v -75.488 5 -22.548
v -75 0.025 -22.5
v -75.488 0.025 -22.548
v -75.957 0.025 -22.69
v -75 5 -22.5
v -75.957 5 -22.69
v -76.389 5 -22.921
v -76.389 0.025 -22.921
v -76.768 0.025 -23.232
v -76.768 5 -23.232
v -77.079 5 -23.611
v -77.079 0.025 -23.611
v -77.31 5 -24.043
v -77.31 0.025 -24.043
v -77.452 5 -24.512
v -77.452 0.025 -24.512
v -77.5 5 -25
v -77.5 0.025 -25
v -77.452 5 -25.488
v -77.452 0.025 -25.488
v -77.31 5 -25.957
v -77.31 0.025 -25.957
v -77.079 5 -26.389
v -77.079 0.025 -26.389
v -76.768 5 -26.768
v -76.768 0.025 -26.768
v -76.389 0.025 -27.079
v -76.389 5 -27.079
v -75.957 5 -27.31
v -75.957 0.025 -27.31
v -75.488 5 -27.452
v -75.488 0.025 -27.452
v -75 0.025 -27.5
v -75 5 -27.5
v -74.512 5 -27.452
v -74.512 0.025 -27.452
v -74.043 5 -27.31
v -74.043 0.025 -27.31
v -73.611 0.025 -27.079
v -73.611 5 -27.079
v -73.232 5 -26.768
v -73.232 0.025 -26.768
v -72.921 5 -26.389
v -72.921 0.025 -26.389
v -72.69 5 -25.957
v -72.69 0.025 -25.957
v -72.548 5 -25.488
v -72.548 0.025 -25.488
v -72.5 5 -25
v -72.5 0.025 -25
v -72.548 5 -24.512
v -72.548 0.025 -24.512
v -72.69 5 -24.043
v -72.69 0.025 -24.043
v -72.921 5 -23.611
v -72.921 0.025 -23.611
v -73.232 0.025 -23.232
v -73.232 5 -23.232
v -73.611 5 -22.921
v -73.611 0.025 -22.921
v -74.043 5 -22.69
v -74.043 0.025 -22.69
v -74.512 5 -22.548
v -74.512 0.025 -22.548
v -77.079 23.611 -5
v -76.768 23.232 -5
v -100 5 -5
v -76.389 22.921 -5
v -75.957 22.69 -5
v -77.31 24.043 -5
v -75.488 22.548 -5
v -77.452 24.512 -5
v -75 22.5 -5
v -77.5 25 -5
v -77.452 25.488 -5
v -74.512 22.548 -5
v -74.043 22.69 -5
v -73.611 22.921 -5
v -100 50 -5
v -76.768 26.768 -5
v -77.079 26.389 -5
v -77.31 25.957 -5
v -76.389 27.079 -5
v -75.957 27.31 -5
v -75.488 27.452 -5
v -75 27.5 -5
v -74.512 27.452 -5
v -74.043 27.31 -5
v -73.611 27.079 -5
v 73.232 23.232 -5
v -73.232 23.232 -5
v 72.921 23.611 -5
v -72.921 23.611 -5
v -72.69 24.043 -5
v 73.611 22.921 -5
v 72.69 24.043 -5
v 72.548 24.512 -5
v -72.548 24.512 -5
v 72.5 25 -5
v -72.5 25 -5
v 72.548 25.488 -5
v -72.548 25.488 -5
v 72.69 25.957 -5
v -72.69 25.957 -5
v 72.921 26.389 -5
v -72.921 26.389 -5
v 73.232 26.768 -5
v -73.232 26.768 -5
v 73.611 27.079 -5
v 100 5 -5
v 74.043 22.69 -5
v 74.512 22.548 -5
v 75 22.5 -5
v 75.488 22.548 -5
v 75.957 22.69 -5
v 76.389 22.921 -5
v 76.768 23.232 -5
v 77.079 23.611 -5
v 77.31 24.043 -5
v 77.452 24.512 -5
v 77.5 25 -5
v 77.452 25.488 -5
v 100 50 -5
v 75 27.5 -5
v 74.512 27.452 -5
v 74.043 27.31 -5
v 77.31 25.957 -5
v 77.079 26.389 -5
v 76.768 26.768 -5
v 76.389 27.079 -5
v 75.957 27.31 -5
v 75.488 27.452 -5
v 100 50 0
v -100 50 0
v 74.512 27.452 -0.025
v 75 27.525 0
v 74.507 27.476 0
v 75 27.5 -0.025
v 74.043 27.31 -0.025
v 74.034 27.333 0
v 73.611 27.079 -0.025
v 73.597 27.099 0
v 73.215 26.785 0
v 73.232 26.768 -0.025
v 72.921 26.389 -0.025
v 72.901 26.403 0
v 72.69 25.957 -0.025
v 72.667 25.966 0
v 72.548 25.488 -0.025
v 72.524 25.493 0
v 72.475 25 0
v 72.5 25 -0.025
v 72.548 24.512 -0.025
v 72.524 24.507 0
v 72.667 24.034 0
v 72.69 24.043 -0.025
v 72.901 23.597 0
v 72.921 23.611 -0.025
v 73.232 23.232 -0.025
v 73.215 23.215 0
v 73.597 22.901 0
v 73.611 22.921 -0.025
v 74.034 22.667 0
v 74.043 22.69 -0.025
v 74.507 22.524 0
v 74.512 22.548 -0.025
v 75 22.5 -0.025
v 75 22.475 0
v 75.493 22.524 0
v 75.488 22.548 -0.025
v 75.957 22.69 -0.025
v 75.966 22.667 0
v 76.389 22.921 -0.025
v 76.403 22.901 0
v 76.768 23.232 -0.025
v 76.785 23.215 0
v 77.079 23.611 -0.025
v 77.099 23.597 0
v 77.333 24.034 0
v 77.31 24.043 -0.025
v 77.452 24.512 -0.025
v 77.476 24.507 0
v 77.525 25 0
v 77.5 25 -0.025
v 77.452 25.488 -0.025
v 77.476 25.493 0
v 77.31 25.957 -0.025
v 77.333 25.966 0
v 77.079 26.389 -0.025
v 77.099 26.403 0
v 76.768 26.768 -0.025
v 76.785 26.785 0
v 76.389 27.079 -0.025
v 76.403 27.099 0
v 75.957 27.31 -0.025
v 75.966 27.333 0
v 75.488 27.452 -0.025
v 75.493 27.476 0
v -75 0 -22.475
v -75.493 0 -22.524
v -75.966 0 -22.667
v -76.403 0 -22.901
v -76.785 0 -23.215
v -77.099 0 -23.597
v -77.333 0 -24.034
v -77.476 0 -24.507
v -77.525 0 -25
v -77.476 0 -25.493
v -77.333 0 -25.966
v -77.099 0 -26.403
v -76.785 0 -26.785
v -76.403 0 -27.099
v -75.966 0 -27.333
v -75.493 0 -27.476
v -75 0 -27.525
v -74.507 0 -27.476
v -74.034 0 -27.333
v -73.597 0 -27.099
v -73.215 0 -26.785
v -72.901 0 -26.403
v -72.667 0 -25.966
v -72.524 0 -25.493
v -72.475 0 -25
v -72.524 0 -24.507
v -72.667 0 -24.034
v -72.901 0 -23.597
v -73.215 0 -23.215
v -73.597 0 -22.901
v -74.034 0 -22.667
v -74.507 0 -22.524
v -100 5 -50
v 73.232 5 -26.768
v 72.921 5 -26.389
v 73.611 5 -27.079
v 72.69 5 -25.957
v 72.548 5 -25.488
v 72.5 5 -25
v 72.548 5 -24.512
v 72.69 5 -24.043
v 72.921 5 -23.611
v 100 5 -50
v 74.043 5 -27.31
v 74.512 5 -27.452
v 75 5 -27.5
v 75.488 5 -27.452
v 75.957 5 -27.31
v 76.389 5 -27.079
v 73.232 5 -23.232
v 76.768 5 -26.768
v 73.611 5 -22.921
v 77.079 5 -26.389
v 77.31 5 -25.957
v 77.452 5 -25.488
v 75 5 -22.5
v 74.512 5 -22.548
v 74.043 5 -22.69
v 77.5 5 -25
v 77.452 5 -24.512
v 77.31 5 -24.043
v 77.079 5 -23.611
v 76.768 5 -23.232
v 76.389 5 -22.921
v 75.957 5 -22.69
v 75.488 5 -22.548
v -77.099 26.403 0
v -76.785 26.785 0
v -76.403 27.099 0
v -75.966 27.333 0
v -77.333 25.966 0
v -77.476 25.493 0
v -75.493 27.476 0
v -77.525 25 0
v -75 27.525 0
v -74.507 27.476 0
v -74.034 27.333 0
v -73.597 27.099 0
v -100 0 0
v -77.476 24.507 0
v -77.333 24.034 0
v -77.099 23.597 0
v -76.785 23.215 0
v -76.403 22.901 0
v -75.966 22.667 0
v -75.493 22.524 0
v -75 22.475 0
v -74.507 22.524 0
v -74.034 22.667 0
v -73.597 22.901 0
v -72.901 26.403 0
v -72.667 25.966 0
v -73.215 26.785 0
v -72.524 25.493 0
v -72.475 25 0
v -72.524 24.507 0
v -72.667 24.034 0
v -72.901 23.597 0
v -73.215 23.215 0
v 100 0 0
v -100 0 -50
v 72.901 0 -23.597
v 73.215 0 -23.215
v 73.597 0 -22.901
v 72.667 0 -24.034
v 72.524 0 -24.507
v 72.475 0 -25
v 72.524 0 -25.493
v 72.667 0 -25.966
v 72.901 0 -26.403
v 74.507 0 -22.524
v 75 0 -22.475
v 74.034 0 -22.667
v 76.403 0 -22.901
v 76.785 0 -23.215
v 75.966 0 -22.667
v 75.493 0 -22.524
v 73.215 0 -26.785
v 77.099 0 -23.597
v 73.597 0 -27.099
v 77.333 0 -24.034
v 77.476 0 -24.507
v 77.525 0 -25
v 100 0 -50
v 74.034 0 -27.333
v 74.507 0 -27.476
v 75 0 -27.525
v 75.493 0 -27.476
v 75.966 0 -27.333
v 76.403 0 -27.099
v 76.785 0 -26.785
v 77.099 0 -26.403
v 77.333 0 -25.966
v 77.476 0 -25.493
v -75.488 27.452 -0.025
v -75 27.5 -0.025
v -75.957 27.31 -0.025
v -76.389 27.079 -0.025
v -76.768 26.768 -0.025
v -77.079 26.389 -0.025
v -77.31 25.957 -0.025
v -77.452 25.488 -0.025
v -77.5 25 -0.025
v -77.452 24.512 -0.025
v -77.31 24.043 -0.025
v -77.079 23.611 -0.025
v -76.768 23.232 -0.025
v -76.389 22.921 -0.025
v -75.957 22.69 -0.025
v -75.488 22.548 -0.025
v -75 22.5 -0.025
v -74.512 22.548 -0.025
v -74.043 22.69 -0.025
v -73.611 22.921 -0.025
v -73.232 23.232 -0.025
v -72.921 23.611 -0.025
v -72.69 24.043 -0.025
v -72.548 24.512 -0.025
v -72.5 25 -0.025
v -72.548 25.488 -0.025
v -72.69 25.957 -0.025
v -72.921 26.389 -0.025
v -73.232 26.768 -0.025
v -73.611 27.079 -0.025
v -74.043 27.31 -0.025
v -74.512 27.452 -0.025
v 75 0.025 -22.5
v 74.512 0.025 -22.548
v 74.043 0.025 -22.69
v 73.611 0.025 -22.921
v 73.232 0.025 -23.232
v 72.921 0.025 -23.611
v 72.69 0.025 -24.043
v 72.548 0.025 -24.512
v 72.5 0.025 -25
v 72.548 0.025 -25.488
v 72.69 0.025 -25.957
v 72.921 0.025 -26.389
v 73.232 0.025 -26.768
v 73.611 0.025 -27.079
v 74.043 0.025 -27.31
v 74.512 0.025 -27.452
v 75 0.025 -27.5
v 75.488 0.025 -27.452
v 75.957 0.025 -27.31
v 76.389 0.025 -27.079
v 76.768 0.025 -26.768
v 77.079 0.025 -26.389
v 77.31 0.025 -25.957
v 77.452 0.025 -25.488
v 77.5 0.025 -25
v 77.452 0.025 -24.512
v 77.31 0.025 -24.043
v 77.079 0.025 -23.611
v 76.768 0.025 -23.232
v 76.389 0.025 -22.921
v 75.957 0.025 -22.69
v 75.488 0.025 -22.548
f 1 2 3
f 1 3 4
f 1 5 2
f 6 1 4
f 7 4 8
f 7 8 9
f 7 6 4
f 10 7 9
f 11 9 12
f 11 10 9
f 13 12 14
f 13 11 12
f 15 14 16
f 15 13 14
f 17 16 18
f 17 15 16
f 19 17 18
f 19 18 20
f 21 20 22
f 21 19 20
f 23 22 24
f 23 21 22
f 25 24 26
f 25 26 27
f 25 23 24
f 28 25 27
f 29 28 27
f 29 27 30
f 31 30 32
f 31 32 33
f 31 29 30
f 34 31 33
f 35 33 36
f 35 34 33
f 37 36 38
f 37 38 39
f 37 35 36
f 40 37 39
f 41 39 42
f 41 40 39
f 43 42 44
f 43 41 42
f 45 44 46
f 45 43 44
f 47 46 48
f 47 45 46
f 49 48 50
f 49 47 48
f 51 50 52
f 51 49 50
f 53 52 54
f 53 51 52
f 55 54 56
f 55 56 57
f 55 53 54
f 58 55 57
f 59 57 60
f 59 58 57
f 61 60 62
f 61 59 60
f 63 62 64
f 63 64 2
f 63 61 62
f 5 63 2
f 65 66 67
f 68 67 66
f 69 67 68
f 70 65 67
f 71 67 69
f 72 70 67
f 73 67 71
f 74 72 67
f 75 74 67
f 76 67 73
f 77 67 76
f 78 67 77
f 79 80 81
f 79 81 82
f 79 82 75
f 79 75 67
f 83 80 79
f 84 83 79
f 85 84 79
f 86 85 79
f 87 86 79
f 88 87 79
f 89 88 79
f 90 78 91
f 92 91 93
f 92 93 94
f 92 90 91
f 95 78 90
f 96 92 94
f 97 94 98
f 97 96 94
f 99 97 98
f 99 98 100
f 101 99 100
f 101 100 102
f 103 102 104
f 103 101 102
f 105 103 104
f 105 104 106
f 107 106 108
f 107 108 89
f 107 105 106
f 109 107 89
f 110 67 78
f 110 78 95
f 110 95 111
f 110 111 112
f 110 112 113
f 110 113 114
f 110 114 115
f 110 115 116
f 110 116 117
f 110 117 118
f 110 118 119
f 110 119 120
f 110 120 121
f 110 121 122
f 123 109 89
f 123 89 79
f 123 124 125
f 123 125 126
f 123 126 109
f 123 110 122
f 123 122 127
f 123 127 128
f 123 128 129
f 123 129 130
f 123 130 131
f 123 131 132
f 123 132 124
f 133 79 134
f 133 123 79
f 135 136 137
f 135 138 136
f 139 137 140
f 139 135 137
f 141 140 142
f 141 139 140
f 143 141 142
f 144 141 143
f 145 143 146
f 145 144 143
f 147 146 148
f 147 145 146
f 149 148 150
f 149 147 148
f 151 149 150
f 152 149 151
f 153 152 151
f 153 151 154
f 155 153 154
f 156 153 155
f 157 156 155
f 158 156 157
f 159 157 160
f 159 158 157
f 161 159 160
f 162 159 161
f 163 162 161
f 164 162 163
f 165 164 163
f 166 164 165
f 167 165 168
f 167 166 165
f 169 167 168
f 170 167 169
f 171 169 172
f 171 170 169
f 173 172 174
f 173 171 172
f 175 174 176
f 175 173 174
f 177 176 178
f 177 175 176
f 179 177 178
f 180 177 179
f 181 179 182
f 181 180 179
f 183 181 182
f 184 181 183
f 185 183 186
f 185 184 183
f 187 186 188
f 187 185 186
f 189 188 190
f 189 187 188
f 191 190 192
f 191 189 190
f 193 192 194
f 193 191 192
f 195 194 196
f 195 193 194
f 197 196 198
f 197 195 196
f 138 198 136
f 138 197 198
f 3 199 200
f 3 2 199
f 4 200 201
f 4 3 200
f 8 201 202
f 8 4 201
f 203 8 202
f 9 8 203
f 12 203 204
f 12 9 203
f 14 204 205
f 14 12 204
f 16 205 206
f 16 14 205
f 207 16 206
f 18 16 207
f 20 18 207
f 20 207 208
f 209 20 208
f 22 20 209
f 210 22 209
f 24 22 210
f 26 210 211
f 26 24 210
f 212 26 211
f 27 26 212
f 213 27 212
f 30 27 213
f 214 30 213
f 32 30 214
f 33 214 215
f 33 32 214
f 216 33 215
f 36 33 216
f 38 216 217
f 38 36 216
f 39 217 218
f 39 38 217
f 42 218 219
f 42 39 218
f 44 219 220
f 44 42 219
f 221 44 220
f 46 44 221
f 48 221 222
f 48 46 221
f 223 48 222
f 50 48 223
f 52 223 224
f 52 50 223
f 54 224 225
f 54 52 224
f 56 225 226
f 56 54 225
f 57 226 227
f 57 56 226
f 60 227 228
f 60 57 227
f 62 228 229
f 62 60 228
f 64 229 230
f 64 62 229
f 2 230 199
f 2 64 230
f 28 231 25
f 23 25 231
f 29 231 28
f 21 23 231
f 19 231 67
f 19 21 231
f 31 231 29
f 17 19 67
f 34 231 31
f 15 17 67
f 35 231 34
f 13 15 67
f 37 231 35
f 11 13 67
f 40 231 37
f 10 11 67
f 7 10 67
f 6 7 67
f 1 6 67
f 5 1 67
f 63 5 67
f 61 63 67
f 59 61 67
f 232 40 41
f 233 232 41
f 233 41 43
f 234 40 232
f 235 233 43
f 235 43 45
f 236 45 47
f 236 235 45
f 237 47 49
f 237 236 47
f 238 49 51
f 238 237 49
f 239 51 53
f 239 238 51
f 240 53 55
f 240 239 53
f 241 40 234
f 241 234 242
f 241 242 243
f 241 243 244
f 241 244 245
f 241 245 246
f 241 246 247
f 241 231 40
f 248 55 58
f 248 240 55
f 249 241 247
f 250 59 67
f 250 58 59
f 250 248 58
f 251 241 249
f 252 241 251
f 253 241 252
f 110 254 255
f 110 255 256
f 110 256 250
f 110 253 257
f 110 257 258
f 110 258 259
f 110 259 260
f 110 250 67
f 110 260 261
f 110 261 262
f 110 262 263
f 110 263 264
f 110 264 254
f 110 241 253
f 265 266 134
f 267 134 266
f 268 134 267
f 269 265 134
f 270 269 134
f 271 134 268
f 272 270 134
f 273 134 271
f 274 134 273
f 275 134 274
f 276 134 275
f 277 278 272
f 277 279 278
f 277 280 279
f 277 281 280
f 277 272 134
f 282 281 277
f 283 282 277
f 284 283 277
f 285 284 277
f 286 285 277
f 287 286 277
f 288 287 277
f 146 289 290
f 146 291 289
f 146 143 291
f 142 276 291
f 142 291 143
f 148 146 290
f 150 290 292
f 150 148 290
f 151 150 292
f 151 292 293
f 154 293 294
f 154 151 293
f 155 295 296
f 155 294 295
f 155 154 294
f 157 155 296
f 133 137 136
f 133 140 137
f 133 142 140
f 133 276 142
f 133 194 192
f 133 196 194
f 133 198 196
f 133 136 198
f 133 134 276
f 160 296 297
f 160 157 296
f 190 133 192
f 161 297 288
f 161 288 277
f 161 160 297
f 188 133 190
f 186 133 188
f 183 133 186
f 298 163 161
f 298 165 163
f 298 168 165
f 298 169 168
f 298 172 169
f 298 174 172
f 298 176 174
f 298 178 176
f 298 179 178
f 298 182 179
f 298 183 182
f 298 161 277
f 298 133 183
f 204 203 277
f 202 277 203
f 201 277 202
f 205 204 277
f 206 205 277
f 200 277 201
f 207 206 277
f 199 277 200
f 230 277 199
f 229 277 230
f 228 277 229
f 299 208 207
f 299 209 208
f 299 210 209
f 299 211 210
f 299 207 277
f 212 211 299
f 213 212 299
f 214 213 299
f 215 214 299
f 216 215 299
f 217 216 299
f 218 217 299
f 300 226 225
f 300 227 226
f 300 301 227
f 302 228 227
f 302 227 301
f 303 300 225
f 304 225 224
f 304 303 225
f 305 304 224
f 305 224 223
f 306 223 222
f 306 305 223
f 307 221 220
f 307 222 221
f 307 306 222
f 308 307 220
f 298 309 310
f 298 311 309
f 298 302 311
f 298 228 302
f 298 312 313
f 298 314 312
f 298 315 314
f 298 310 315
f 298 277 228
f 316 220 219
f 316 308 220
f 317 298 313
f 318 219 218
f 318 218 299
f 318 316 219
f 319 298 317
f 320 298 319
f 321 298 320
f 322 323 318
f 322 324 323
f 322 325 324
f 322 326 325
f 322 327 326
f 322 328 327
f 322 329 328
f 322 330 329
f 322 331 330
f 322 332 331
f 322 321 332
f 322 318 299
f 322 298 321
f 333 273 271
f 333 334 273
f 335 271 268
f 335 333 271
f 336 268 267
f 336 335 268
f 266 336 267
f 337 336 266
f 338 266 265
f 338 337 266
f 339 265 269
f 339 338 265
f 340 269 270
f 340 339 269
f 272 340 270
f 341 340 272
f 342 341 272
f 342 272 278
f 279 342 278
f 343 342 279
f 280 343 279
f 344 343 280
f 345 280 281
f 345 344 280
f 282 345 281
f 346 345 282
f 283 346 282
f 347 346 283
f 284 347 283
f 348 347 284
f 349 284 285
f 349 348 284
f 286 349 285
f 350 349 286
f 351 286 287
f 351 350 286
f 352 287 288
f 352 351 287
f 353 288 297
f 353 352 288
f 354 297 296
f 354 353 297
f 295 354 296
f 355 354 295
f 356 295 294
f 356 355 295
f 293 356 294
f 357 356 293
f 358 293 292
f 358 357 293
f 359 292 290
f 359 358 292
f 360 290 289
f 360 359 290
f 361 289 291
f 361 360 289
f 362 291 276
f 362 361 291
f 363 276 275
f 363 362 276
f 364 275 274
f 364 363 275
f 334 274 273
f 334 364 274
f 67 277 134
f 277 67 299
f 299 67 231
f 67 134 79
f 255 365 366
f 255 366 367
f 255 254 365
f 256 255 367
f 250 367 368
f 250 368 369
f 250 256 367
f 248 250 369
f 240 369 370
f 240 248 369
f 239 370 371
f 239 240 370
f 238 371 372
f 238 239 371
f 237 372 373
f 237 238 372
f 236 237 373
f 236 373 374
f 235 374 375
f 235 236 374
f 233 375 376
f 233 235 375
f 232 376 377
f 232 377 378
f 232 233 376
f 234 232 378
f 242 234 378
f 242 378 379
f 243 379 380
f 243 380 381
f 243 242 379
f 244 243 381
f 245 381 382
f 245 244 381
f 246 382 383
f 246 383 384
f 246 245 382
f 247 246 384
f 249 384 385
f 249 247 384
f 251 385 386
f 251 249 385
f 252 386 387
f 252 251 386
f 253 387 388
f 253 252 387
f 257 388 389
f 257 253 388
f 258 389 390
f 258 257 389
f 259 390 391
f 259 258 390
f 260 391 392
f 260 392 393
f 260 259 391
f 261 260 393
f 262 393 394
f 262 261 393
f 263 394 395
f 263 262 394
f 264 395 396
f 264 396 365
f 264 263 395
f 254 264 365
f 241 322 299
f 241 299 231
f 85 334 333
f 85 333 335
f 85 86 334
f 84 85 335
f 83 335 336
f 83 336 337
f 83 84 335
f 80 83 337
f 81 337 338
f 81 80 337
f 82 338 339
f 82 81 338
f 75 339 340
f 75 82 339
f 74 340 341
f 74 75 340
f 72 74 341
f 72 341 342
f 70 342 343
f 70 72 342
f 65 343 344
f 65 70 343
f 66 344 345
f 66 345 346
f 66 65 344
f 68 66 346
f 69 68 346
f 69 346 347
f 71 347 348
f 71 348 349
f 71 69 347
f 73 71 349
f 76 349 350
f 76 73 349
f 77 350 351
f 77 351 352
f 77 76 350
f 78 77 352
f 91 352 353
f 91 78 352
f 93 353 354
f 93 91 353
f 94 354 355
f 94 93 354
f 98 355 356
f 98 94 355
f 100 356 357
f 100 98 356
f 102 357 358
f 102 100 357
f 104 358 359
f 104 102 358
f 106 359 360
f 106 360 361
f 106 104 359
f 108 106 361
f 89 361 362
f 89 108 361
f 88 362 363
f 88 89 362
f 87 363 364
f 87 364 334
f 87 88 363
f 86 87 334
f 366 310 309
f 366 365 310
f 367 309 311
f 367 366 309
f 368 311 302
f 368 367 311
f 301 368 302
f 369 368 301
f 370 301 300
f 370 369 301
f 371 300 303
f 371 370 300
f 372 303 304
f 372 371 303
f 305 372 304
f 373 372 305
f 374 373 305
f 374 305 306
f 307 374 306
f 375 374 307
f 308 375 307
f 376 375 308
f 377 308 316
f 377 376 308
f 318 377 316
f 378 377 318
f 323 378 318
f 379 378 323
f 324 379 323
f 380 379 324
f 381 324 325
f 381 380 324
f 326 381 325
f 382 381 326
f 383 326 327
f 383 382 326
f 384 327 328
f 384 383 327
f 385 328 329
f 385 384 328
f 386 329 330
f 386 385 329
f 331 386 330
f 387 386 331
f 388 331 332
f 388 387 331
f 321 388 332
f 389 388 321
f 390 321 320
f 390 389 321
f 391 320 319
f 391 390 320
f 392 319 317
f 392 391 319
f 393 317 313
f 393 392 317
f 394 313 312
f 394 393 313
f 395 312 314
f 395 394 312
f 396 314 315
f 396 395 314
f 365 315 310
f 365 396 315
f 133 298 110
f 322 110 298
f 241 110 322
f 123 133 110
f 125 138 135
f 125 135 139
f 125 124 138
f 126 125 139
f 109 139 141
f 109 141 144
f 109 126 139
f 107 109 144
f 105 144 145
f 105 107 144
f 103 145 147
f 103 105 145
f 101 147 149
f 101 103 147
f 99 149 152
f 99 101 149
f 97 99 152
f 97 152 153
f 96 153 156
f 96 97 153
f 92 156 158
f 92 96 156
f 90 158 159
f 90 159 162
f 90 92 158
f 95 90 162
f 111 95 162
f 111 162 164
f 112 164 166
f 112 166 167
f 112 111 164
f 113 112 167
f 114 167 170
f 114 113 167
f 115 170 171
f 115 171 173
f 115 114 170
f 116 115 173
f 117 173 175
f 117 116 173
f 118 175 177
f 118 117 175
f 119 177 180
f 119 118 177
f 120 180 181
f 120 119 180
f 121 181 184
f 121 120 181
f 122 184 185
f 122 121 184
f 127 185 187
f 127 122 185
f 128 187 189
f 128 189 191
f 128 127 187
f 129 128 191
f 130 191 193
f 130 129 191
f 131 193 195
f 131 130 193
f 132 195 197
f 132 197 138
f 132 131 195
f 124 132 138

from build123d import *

# Parameters (mm, degrees)
EXTRUDE_THIN1_DEPTH            = 100
F_5_0MM_DOWEL_HOLE1_AT_2_COUNT = 2
F_5_0MM_DOWEL_HOLE1_AT_2_PITCH = 150
F_5_0MM_DOWEL_HOLE2_AT_2_COUNT = 2
F_5_0MM_DOWEL_HOLE2_AT_2_PITCH = 150


with BuildPart() as part:
    # Sketch2 → Extrude-Thin1 (new, symmetric)
    with BuildSketch(Plane(origin=(0, 0, 0), x_dir=(0, 0, -1), z_dir=(1, 0, 0))):
        Polygon((0, 50), (0, 0), (50, 0), (50, 5), (5, 5), (5, 50), align=None)
    extrude(amount=EXTRUDE_THIN1_DEPTH, both=True)

    # Sketch5 → Ø5.0mm Dowel Hole1 (revolve, cut)
    with BuildSketch(Plane(origin=(75, 25, -5), x_dir=(0, 1, 0), z_dir=(1, 0, 0))):
        Polygon((0, 0), (0, 5), (2.525, 5), (2.5, 4.975), (2.5, 0), align=None)
    f_5_0mm_dowel_hole1 = revolve(axis=Axis((75, 25, -11.35), (0, 0, 1)), mode=Mode.SUBTRACT)

    # Ø5.0mm Dowel Hole1 at 2: Ø5.0mm Dowel Hole1 ×2
    with Locations(*[(-i * F_5_0MM_DOWEL_HOLE1_AT_2_PITCH, 0, 0) for i in range(1, F_5_0MM_DOWEL_HOLE1_AT_2_COUNT)]):
        add(f_5_0mm_dowel_hole1, mode=Mode.SUBTRACT)

    # Sketch7 → Ø5.0mm Dowel Hole2 (revolve, cut)
    with BuildSketch(Plane(origin=(-75, 5, -25), x_dir=(0, 0, 1), z_dir=(1, 0, 0))):
        Polygon((0, 0), (0, 5), (2.525, 5), (2.5, 4.975), (2.5, 0), align=None)
    f_5_0mm_dowel_hole2 = revolve(axis=Axis((-75, 11.35, -25), (0, -1, 0)), mode=Mode.SUBTRACT)

    # Ø5.0mm Dowel Hole2 at 2: Ø5.0mm Dowel Hole2 ×2
    with Locations(*[(i * F_5_0MM_DOWEL_HOLE2_AT_2_PITCH, 0, 0) for i in range(1, F_5_0MM_DOWEL_HOLE2_AT_2_COUNT)]):
        add(f_5_0mm_dowel_hole2, mode=Mode.SUBTRACT)


solid = part.part
